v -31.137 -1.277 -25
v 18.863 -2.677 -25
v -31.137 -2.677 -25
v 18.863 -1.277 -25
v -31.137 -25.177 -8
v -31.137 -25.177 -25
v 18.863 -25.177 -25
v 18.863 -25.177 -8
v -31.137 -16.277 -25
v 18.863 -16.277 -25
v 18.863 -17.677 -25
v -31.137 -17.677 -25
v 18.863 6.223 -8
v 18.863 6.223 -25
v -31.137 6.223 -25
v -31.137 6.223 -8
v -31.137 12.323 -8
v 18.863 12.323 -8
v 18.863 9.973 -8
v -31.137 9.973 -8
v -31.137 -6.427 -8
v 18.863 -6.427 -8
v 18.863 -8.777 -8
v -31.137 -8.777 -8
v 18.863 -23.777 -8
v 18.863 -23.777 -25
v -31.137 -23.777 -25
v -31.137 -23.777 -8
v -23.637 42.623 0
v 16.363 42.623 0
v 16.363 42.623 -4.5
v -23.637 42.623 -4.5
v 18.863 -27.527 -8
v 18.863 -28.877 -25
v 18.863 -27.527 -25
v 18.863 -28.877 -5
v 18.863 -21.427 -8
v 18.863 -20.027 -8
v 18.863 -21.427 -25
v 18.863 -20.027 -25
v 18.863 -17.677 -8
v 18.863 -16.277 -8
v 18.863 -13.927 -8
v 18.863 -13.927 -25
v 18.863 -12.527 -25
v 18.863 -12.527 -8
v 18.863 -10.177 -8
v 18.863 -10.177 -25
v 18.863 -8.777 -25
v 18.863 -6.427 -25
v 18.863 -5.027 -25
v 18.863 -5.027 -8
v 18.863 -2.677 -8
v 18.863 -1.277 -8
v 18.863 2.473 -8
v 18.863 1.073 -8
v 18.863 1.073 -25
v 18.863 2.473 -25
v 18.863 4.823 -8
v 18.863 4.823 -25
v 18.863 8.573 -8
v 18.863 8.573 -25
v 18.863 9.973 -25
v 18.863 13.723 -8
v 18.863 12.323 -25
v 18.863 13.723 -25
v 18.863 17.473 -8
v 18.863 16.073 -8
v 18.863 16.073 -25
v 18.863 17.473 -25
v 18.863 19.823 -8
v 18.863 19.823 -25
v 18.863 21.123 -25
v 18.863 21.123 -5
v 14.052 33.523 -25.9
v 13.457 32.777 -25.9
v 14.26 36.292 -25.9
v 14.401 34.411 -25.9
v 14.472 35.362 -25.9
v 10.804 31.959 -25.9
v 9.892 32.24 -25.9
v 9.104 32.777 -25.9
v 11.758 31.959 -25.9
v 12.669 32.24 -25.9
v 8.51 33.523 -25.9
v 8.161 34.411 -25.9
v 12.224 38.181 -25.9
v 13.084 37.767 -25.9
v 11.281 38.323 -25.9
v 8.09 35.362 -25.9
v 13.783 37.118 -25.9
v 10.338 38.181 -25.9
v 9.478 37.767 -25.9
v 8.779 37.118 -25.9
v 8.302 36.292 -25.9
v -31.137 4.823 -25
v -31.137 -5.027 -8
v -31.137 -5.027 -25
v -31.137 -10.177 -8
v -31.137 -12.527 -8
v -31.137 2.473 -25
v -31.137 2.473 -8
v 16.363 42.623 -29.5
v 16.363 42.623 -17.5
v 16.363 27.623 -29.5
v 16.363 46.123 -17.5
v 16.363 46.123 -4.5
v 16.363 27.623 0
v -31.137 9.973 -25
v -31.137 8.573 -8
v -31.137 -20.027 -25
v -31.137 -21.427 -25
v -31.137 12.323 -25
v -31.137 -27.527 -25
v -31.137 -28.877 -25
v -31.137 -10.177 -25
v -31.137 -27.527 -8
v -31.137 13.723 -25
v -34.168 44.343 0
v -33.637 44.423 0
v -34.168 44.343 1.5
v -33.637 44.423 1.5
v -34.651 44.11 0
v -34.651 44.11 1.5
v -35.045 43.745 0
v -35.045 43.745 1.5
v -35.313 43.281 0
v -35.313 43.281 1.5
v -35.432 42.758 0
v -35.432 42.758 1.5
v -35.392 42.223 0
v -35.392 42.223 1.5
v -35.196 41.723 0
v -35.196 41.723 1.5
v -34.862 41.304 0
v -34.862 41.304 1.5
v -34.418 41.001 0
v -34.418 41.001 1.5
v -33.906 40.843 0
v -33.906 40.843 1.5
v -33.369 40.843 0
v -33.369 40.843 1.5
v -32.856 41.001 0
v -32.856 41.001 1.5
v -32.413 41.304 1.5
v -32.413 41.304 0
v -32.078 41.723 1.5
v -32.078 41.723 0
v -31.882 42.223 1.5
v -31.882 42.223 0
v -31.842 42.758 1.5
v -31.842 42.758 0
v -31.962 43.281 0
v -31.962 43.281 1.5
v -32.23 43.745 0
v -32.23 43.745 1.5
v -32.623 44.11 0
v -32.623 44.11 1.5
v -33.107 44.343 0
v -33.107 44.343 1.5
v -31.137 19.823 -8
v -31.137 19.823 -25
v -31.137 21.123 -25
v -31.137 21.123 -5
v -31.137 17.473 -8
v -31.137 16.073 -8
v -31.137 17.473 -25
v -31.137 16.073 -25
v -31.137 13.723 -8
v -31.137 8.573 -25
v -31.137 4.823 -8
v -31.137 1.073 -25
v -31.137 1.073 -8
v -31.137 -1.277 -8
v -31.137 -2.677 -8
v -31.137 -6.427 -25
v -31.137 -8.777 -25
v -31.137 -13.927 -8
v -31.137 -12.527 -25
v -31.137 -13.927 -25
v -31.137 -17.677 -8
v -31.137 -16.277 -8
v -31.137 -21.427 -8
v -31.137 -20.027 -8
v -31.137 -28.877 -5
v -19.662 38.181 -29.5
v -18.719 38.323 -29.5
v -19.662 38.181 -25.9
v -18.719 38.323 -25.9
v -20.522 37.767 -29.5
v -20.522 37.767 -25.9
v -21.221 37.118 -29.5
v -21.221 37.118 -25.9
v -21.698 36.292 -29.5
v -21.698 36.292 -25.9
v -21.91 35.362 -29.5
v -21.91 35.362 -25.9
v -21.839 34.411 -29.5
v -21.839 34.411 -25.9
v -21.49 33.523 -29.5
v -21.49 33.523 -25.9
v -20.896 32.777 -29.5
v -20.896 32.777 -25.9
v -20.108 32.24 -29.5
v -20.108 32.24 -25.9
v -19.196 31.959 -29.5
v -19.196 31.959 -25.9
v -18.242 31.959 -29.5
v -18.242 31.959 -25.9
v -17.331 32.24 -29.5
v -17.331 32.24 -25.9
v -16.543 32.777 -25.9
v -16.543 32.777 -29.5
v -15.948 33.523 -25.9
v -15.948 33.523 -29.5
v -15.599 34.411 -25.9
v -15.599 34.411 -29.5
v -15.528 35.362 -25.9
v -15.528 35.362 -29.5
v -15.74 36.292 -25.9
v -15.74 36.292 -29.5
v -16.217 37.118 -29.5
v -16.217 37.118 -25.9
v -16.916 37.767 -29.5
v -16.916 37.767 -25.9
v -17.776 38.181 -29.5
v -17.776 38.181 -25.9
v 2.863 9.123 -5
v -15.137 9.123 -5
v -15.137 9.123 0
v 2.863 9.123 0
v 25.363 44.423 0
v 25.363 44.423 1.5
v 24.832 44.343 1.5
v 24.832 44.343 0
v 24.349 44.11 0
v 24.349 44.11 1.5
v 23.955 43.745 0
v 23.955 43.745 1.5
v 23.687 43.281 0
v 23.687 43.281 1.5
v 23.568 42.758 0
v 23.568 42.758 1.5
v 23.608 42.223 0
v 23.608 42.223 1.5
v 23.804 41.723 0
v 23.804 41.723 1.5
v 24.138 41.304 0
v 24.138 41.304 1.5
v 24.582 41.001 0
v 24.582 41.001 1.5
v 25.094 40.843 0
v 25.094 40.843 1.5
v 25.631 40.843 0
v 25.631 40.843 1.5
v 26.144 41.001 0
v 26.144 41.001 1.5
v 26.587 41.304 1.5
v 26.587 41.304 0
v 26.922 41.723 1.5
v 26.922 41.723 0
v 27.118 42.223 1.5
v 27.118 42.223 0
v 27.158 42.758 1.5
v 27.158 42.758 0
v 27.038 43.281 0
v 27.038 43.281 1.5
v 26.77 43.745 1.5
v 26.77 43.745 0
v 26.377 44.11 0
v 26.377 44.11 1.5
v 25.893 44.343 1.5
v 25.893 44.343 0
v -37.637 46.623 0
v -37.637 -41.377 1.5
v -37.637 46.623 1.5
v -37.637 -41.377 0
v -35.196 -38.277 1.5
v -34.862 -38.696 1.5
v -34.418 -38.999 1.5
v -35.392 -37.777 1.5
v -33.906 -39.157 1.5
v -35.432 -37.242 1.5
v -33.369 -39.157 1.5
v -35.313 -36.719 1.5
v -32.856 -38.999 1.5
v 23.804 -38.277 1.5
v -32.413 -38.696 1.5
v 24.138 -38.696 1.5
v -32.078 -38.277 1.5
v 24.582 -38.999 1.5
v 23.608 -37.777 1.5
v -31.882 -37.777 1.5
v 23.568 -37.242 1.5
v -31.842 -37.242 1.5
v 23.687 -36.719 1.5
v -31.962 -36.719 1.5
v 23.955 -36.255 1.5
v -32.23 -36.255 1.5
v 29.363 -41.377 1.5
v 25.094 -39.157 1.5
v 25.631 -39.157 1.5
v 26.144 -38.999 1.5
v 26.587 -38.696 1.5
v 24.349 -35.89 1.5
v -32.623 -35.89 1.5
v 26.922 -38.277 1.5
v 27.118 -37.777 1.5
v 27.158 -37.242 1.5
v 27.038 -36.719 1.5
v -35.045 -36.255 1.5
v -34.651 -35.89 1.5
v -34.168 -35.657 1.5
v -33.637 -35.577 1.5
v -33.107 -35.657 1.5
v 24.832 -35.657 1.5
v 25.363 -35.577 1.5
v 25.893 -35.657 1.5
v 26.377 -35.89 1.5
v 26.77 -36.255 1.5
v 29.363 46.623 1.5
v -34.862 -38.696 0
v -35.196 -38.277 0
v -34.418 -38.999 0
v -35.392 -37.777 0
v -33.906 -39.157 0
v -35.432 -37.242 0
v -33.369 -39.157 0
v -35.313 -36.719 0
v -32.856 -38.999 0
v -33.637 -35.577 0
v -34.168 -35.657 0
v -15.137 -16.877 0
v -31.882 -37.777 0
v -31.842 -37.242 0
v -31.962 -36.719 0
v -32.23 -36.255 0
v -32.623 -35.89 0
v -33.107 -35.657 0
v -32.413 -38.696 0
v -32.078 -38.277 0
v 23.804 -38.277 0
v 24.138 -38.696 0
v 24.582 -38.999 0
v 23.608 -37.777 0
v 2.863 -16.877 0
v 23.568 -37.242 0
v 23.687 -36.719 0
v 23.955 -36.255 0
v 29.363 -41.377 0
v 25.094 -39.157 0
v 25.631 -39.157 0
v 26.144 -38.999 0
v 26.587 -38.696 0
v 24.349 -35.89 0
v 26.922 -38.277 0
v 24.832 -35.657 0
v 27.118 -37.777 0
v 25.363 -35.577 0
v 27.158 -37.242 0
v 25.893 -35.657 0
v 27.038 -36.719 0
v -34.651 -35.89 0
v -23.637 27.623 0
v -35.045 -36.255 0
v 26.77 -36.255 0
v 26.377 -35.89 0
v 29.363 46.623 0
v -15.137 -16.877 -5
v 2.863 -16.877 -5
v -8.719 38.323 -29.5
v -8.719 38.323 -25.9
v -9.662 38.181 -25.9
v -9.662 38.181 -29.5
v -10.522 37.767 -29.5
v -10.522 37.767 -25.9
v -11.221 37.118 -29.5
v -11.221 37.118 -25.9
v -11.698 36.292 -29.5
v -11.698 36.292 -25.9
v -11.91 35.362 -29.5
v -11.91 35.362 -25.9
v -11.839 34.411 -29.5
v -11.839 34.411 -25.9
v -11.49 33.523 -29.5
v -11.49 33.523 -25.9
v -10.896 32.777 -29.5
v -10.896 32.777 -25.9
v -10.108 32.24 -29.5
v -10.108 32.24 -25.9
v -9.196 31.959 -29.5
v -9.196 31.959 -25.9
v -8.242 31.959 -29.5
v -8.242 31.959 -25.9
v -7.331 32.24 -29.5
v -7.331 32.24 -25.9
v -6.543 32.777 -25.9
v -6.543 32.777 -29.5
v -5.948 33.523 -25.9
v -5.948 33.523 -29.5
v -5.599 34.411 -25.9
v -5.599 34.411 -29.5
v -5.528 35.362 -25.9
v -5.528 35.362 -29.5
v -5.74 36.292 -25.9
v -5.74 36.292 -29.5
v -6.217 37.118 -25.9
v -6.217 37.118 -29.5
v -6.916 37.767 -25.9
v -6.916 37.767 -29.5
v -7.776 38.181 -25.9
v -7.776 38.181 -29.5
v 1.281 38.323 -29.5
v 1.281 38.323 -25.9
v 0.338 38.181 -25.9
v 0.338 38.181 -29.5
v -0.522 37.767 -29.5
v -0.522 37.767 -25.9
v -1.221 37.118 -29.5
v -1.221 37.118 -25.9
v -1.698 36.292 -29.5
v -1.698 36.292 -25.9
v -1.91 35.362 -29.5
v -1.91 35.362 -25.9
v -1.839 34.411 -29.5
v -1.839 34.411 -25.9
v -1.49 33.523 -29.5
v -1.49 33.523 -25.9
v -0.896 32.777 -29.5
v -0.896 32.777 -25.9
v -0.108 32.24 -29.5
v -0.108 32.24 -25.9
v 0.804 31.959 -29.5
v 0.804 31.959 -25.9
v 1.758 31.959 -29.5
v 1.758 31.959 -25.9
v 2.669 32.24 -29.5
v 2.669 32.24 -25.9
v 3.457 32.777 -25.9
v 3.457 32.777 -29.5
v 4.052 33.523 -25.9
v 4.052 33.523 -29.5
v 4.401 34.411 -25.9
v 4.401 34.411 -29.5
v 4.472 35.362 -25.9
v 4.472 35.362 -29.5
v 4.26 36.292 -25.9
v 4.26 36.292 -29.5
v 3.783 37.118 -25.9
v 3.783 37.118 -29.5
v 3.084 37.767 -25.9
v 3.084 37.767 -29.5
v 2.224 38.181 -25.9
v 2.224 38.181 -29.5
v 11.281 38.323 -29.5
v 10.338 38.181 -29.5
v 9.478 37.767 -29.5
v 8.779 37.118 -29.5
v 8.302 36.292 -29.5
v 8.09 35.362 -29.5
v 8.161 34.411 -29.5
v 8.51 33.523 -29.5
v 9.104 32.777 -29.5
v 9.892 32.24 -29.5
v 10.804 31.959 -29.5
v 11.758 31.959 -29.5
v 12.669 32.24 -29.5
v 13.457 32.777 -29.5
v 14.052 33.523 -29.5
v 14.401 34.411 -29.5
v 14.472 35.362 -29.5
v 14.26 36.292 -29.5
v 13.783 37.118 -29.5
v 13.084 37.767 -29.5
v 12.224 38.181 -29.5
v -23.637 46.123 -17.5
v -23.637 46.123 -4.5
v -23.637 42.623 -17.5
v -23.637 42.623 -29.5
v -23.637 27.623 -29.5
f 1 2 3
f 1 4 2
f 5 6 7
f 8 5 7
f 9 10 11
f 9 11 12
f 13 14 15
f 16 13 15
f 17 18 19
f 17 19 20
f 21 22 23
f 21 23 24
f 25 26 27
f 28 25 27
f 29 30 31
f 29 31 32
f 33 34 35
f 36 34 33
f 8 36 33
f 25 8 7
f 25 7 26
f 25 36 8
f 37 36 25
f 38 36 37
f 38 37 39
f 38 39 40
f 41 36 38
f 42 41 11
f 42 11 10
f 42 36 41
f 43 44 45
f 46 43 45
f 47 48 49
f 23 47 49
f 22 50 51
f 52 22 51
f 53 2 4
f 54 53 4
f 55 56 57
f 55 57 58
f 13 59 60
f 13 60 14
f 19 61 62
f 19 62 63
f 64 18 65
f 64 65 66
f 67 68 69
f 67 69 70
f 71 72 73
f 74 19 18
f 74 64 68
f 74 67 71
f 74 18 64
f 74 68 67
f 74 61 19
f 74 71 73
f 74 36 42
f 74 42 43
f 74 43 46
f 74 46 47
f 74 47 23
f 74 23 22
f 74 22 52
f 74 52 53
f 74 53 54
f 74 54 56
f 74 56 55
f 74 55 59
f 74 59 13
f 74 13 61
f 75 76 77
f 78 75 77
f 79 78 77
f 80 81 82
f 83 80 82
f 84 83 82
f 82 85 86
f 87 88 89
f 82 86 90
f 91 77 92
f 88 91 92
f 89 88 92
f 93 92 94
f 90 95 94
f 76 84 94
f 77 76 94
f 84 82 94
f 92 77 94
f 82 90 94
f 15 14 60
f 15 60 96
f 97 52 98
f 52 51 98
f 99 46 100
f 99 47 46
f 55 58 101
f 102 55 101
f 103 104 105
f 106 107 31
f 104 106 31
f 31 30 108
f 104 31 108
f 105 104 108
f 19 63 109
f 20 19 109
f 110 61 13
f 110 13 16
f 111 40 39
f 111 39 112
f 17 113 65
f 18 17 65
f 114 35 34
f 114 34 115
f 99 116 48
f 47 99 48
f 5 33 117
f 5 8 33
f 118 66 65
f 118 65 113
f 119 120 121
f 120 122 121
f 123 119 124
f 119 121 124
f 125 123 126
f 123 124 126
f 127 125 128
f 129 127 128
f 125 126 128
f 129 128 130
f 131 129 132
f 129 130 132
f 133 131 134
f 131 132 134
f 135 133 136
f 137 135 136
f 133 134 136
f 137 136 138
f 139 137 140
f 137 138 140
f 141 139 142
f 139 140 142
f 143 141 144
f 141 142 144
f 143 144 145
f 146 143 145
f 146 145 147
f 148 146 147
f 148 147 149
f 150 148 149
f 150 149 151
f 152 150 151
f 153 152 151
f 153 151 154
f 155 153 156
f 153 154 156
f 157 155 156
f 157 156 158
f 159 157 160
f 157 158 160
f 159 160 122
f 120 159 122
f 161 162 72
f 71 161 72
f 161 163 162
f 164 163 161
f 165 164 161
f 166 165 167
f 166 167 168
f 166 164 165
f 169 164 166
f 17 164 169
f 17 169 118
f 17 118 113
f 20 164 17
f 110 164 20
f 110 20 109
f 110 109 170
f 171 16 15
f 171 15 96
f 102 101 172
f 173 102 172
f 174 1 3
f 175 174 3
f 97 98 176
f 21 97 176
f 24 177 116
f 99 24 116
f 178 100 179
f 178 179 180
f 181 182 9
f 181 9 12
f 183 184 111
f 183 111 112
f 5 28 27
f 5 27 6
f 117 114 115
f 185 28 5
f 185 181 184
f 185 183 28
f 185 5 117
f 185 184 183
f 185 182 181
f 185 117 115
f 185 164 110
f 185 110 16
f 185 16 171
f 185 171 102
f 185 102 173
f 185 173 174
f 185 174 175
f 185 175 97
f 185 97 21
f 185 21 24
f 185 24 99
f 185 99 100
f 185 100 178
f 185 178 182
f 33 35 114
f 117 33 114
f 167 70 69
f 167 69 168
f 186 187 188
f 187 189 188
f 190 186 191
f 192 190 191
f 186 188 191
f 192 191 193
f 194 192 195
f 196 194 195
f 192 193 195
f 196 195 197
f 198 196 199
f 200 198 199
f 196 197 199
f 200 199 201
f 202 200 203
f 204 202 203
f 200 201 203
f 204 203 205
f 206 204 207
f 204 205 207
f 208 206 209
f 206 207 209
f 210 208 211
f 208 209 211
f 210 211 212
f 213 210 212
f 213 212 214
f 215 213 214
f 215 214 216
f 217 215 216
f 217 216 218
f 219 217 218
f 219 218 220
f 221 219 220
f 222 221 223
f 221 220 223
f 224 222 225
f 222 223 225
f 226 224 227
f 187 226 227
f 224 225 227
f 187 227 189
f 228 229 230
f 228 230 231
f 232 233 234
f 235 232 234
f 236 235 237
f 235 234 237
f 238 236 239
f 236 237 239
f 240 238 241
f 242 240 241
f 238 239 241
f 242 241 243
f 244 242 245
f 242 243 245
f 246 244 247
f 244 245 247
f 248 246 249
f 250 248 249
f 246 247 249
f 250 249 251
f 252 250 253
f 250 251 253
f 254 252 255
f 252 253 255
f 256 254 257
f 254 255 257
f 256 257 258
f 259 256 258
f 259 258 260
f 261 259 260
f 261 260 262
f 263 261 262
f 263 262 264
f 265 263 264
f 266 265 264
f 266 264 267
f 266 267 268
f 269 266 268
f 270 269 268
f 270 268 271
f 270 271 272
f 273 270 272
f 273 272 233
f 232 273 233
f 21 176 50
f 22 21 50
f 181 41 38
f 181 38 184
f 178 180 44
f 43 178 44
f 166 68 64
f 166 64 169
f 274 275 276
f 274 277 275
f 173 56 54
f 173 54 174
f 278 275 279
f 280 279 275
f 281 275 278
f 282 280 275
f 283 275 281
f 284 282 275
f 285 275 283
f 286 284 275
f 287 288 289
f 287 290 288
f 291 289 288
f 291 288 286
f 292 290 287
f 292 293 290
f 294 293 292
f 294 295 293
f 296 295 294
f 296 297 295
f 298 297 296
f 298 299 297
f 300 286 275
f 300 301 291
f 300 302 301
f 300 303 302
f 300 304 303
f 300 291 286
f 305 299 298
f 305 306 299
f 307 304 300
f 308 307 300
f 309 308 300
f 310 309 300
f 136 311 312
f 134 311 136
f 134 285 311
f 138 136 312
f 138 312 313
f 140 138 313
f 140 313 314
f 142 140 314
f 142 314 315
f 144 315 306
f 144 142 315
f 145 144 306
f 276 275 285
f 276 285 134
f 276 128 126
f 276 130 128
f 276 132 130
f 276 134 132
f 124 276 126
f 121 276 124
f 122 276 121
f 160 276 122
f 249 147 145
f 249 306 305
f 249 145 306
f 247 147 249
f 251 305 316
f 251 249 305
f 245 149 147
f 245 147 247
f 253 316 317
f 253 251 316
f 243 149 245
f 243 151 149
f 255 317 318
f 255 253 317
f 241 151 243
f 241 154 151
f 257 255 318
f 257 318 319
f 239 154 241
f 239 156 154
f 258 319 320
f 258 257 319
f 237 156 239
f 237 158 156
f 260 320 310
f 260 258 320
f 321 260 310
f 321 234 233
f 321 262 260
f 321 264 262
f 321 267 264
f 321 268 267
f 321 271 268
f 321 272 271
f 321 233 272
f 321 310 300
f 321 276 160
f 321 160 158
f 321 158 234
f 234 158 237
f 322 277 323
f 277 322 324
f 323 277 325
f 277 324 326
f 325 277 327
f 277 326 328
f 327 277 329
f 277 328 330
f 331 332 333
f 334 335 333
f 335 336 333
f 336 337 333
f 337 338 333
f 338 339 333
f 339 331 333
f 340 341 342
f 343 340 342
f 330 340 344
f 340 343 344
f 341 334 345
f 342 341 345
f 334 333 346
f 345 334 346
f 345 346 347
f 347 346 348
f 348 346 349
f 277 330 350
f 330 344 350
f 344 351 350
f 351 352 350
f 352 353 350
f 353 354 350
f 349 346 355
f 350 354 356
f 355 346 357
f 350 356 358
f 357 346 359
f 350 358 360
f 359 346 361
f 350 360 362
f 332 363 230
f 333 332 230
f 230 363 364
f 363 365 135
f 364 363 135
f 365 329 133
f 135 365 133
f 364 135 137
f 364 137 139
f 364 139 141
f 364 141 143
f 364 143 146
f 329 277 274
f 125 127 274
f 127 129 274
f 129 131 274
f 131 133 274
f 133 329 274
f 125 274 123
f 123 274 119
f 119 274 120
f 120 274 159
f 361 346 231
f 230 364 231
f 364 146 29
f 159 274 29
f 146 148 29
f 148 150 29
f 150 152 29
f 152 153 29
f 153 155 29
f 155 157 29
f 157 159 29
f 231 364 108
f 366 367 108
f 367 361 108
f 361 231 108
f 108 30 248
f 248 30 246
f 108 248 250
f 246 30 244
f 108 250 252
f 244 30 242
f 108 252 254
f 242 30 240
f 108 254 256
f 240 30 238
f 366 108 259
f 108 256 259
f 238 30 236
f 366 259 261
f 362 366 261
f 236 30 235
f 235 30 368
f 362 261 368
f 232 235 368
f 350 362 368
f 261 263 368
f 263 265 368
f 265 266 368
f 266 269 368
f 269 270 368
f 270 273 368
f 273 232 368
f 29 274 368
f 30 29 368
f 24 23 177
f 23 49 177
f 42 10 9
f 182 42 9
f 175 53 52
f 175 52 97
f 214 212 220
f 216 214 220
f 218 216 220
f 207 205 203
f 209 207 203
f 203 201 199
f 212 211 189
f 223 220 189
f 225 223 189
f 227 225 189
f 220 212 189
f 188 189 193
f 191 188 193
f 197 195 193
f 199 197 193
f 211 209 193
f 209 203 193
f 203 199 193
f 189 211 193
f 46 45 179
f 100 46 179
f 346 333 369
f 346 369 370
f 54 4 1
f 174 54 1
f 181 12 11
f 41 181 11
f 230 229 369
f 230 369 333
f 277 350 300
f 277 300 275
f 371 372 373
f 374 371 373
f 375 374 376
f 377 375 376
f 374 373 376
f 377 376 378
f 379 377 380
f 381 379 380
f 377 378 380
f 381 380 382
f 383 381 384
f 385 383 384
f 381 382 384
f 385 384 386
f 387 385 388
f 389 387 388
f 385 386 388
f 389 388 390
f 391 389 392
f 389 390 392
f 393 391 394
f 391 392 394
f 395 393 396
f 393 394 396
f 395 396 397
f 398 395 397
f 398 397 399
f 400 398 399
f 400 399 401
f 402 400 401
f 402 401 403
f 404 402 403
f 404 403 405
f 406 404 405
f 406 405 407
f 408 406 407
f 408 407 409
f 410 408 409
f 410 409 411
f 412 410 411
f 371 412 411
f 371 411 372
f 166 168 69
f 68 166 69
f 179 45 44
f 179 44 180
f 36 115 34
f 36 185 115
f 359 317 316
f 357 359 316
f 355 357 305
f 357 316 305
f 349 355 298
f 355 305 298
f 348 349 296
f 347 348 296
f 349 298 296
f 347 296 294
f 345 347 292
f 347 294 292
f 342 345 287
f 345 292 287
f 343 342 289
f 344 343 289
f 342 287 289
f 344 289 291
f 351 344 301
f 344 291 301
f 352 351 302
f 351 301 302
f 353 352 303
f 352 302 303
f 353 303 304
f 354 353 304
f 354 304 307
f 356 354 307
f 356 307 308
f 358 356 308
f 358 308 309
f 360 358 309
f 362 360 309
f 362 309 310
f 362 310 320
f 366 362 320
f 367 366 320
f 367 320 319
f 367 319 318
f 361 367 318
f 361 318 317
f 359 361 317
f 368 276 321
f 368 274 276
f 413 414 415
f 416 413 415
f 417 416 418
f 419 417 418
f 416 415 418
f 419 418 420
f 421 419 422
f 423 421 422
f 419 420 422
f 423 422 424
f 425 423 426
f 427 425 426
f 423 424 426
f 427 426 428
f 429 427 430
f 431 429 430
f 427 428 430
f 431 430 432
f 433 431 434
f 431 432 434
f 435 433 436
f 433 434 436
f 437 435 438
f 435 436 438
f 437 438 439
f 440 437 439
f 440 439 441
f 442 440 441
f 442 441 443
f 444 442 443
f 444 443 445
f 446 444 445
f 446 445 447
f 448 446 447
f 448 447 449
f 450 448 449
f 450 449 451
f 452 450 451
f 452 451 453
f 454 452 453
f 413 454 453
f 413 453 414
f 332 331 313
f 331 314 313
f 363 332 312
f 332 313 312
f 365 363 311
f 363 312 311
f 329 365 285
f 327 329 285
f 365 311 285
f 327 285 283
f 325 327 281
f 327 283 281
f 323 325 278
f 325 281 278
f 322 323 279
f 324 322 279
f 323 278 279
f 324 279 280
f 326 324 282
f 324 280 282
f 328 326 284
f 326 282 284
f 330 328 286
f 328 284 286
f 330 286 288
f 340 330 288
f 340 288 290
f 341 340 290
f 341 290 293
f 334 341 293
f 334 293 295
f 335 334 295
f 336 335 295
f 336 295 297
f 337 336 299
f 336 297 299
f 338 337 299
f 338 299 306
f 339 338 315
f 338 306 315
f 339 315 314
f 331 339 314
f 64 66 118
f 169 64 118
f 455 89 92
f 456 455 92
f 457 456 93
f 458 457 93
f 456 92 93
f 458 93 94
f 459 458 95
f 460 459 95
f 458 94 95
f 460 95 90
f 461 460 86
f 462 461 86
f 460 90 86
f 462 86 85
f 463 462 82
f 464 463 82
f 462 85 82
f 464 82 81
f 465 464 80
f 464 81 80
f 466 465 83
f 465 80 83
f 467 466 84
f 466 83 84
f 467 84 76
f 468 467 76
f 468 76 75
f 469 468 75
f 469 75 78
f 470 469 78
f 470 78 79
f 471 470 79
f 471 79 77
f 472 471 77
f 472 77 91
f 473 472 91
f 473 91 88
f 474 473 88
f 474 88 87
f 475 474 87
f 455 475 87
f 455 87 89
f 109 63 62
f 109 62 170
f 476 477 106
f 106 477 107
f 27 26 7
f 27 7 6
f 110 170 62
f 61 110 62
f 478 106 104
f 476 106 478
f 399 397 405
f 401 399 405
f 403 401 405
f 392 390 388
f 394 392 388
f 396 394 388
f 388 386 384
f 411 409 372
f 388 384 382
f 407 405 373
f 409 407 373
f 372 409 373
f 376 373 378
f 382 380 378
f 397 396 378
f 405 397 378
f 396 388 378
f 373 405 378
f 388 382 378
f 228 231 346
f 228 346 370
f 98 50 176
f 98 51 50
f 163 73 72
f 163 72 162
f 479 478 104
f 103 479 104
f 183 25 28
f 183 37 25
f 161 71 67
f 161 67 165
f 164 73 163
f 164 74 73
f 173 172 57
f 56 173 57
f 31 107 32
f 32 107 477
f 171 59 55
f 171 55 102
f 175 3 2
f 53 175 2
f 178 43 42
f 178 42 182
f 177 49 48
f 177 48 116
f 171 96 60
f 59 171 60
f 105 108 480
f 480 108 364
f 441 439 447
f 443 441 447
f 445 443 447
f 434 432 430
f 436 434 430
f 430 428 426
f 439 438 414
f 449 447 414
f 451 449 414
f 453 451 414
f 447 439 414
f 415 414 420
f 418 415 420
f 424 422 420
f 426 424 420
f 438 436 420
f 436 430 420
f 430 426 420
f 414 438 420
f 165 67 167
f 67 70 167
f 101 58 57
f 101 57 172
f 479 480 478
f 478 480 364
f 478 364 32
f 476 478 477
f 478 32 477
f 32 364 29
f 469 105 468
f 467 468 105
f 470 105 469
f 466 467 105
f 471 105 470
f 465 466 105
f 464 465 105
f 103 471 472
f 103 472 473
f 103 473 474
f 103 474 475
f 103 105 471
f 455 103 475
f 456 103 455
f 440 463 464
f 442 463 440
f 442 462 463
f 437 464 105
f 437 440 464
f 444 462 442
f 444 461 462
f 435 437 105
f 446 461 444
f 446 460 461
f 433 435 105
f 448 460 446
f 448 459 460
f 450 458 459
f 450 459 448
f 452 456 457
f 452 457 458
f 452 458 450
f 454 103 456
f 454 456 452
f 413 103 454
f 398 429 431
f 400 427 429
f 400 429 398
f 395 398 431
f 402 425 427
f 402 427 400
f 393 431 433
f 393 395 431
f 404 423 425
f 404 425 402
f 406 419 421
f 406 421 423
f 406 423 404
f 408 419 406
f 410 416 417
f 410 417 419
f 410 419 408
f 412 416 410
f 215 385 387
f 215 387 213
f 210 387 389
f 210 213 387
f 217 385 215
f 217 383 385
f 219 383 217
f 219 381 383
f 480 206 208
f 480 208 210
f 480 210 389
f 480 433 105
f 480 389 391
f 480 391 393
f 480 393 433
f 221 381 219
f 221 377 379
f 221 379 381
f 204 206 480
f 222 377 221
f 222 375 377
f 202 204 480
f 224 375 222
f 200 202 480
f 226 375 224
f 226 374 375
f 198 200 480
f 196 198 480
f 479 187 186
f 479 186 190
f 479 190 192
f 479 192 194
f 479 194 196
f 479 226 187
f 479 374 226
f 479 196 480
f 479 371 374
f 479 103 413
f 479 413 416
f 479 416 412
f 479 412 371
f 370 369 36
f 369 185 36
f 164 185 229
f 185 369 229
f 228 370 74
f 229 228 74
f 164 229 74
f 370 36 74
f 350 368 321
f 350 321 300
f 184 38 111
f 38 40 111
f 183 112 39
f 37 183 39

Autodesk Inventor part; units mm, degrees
ref_plane "YZ Plane" through (0, 0, 0) normal (1, 0, 0) x (0, 1, 0)
ref_plane "XZ Plane" through (0, 0, 0) normal (0, 1, 0) x (-1, 0, 0)
ref_plane "XY Plane" through (0, 0, 0) normal (0, 0, 1) x (1, 0, 0)
sketch "Szkic1" plane through (0, 0, 0) normal (0, 0, 1) x (1, 0, 0)
  line L0 (-37.6373, 46.6232) -> (29.3627, 46.6232)
  line L1 (29.3627, 46.6232) -> (29.3627, -41.3768)
  line L2 (29.3627, -41.3768) -> (-37.6373, -41.3768)
  line L3 (-37.6373, -41.3768) -> (-37.6373, 46.6232)
  point P0 (0, 0)
  point P1 (-33.6373, 42.6232)
  point P2 (25.3627, 42.6232)
  point P3 (25.3627, -37.3768)
  point P4 (-33.6373, -37.3768)
  dimension "d0" = 88
  dimension "d1" = 67
  dimension "d2" = 59
  dimension "d3" = 80
  dimension "d4" = 80
  dimension "d5" = 59
  dimension "d6" = 4
  dimension "d7" = 4
  dimension "d8" = 4
  dimension "d9" = 4
  dimension "d10" = 4
  dimension "d11" = 4
  dimension "d12" = 4
extrude "Wyciągnięcie proste1" add sketch "Szkic1" along normal blind 1.5
hole "Otwór1" at (-33.6373, 42.6232, 0) at (25.3627, 42.6232, 0) at (25.3627, -37.3768, 0) at (-33.6373, -37.3768, 0) direction (0, 0, 1) diameter 3.6 end through all
sketch "Szkic2" plane through (0, 0, 0) normal (0, 0, -1) x (-1, 0, 0)
  line L0 (-18.8627, 21.1232) -> (31.1373, 21.1232)
  line L1 (31.1373, 21.1232) -> (31.1373, -28.8768)
  line L2 (31.1373, -28.8768) -> (-18.8627, -28.8768)
  line L3 (-18.8627, -28.8768) -> (-18.8627, 21.1232)
  circle A0 centre (-25.3627, -37.3768) radius 1.8 projected
  circle A1 centre (33.6373, 42.6232) radius 1.8 projected
  circle A2 centre (-25.3627, 42.6232) radius 1.8 projected
  circle A3 centre (33.6373, -37.3768) radius 1.8 projected
  line L4 (37.6373, 46.6232) -> (-29.3627, 46.6232) projected
  line L5 (-29.3627, 46.6232) -> (-29.3627, -41.3768) projected
  line L6 (-29.3627, -41.3768) -> (37.6373, -41.3768) projected
  line L7 (37.6373, -41.3768) -> (37.6373, 46.6232) projected
  line L8 (-16.3627, 42.6232) -> (23.6373, 42.6232)
  line L9 (23.6373, 42.6232) -> (23.6373, 27.6232)
  line L10 (23.6373, 27.6232) -> (-16.3627, 27.6232)
  line L11 (-16.3627, 27.6232) -> (-16.3627, 42.6232)
  point P0 (0, 0)
  dimension "d22" = 50
  dimension "d23" = 50
  dimension "d24" = 6.5
  dimension "d25" = 12.5
  dimension "d26" = 40
  dimension "d27" = 15
  dimension "d28" = 13
  dimension "d29" = 4
extrude "Wyciągnięcie proste2" add sketch "Szkic2" along normal blind 25 contours L0 L1 L2 L3
sketch "Szkic3" plane through (0, 0, -25) normal (0, 0, -1) x (-1, 0, 0)
  line L0 (31.1373, 21.1232) -> (-18.8627, 21.1232) projected
  line L1 (-18.8627, 21.1232) -> (-18.8627, -28.8768) projected
  line L2 (-18.8627, -28.8768) -> (31.1373, -28.8768) projected
  line L3 (31.1373, -28.8768) -> (31.1373, 21.1232) projected
  line L4 (-18.8627, -28.8768) -> (-18.8627, 21.1232) projected
  line L5 (-18.8627, -27.5268) -> (31.1373, -27.5268)
  line L6 (31.1373, -27.5268) -> (31.1373, -25.1768)
  line L7 (31.1373, -25.1768) -> (-18.8627, -25.1768)
  line L8 (-18.8627, -25.1768) -> (-18.8627, -27.5268)
  line L9 (-18.8627, -23.7768) -> (31.1373, -23.7768)
  line L10 (31.1373, -23.7768) -> (31.1373, -21.4268)
  line L11 (31.1373, -21.4268) -> (-18.8627, -21.4268)
  line L12 (-18.8627, -21.4268) -> (-18.8627, -23.7768)
  line L13 (-18.8627, -20.0268) -> (31.1373, -20.0268)
  line L14 (31.1373, -20.0268) -> (31.1373, -17.6768)
  line L15 (31.1373, -17.6768) -> (-18.8627, -17.6768)
  line L16 (-18.8627, -17.6768) -> (-18.8627, -20.0268)
  line L17 (-18.8627, -16.2768) -> (31.1373, -16.2768)
  line L18 (31.1373, -16.2768) -> (31.1373, -13.9268)
  line L19 (31.1373, -13.9268) -> (-18.8627, -13.9268)
  line L20 (-18.8627, -13.9268) -> (-18.8627, -16.2768)
  line L21 (-18.8627, -12.5268) -> (31.1373, -12.5268)
  line L22 (31.1373, -12.5268) -> (31.1373, -10.1768)
  line L23 (31.1373, -10.1768) -> (-18.8627, -10.1768)
  line L24 (-18.8627, -10.1768) -> (-18.8627, -12.5268)
  line L25 (-18.8627, -8.7768) -> (31.1373, -8.7768)
  line L26 (31.1373, -8.7768) -> (31.1373, -6.4268)
  line L27 (31.1373, -6.4268) -> (-18.8627, -6.4268)
  line L28 (-18.8627, -6.4268) -> (-18.8627, -8.7768)
  line L29 (-18.8627, -5.0268) -> (31.1373, -5.0268)
  line L30 (31.1373, -5.0268) -> (31.1373, -2.6768)
  line L31 (31.1373, -2.6768) -> (-18.8627, -2.6768)
  line L32 (-18.8627, -2.6768) -> (-18.8627, -5.0268)
  line L33 (-18.8627, -1.2768) -> (31.1373, -1.2768)
  line L34 (31.1373, -1.2768) -> (31.1373, 1.0732)
  line L35 (31.1373, 1.0732) -> (-18.8627, 1.0732)
  line L36 (-18.8627, 1.0732) -> (-18.8627, -1.2768)
  line L37 (-18.8627, 2.4732) -> (31.1373, 2.4732)
  line L38 (31.1373, 2.4732) -> (31.1373, 4.8232)
  line L39 (31.1373, 4.8232) -> (-18.8627, 4.8232)
  line L40 (-18.8627, 4.8232) -> (-18.8627, 2.4732)
  line L41 (-18.8627, 6.2232) -> (31.1373, 6.2232)
  line L42 (31.1373, 6.2232) -> (31.1373, 8.5732)
  line L43 (31.1373, 8.5732) -> (-18.8627, 8.5732)
  line L44 (-18.8627, 8.5732) -> (-18.8627, 6.2232)
  line L45 (-18.8627, 9.9732) -> (31.1373, 9.9732)
  line L46 (31.1373, 9.9732) -> (31.1373, 12.3232)
  line L47 (31.1373, 12.3232) -> (-18.8627, 12.3232)
  line L48 (-18.8627, 12.3232) -> (-18.8627, 9.9732)
  line L49 (-18.8627, 13.7232) -> (31.1373, 13.7232)
  line L50 (31.1373, 13.7232) -> (31.1373, 16.0732)
  line L51 (31.1373, 16.0732) -> (-18.8627, 16.0732)
  line L52 (-18.8627, 16.0732) -> (-18.8627, 13.7232)
  line L53 (-18.8627, 17.4732) -> (31.1373, 17.4732)
  line L54 (31.1373, 17.4732) -> (31.1373, 19.8232)
  line L55 (31.1373, 19.8232) -> (-18.8627, 19.8232)
  line L56 (-18.8627, 19.8232) -> (-18.8627, 17.4732)
  point P0 (0, 0)
  dimension "d32" = 50
  dimension "d33" = 2.35
  dimension "d34" = 1.35
  dimension "d37" = 3.75
extrude "Wyciągnięcie proste3" cut sketch "Szkic3" against normal blind 17 contours L3 L53 L1 L55 | L3 L49 L1 L51 | L3 L45 L1 L47 | L3 L41 L1 L43 | L3 L37 L1 L39 | L3 L33 L1 L35 | L3 L29 L1 L31 | L3 L25 L1 L27 | L3 L21 L1 L23 | L3 L17 L1 L19 | L3 L13 L1 L15 | L3 L9 L1 L11 | L3 L5 L1 L7
sketch "Szkic4" plane through (-31.1373, -28.8768, 0) normal (-1, 0, 0) x (0, 0, 1)
  line L0 (-8, 42.6) -> (-25, 42.6) projected
  line L1 (-25, 41.2) -> (-25, 42.6) projected
  line L2 (-25, 41.2) -> (-8, 41.2) projected
  line L3 (-8, 41.2) -> (-8, 38.85) projected
  line L4 (-8, 38.85) -> (-25, 38.85) projected
  line L5 (-25, 37.45) -> (-25, 38.85) projected
  line L6 (-25, 37.45) -> (-8, 37.45) projected
  line L7 (-8, 37.45) -> (-8, 35.1) projected
  line L8 (-8, 35.1) -> (-25, 35.1) projected
  line L9 (-25, 33.7) -> (-25, 35.1) projected
  line L10 (-25, 33.7) -> (-8, 33.7) projected
  line L11 (-8, 33.7) -> (-8, 31.35) projected
  line L12 (-8, 31.35) -> (-25, 31.35) projected
  line L13 (-25, 29.95) -> (-25, 31.35) projected
  line L14 (-25, 29.95) -> (-8, 29.95) projected
  line L15 (-8, 29.95) -> (-8, 27.6) projected
  line L16 (-8, 27.6) -> (-25, 27.6) projected
  line L17 (-25, 26.2) -> (-25, 27.6) projected
  line L18 (-25, 26.2) -> (-8, 26.2) projected
  line L19 (-8, 26.2) -> (-8, 23.85) projected
  line L20 (-8, 23.85) -> (-25, 23.85) projected
  line L21 (-25, 22.45) -> (-25, 23.85) projected
  line L22 (-25, 22.45) -> (-8, 22.45) projected
  line L23 (-8, 22.45) -> (-8, 20.1) projected
  line L24 (-8, 20.1) -> (-25, 20.1) projected
  line L25 (-25, 18.7) -> (-25, 20.1) projected
  line L26 (-25, 18.7) -> (-8, 18.7) projected
  line L27 (-8, 18.7) -> (-8, 16.35) projected
  line L28 (-8, 16.35) -> (-25, 16.35) projected
  line L29 (-25, 14.95) -> (-25, 16.35) projected
  line L30 (-25, 14.95) -> (-8, 14.95) projected
  line L31 (-8, 14.95) -> (-8, 12.6) projected
  line L32 (-8, 12.6) -> (-25, 12.6) projected
  line L33 (-25, 11.2) -> (-25, 12.6) projected
  line L34 (-25, 11.2) -> (-8, 11.2) projected
  line L35 (-8, 11.2) -> (-8, 8.85) projected
  line L36 (-8, 8.85) -> (-25, 8.85) projected
  line L37 (-25, 7.45) -> (-25, 8.85) projected
  line L38 (-25, 7.45) -> (-8, 7.45) projected
  line L39 (-8, 7.45) -> (-8, 5.1) projected
  line L40 (-8, 5.1) -> (-25, 5.1) projected
  line L41 (-25, 3.7) -> (-25, 5.1) projected
  line L42 (-25, 3.7) -> (-8, 3.7) projected
  line L43 (-8, 3.7) -> (-8, 1.35) projected
  line L44 (-8, 1.35) -> (-25, 1.35) projected
  line L45 (-25, 0) -> (-25, 1.35) projected
  line L46 (0, 0) -> (-25, 0) projected
  line L47 (0, 50) -> (0, 0) projected
  line L48 (0, 50) -> (-25, 50) projected
  line L49 (-25, 48.7) -> (-25, 50) projected
  line L50 (-25, 48.7) -> (-8, 48.7) projected
  line L51 (-8, 48.7) -> (-8, 46.35) projected
  line L52 (-8, 46.35) -> (-25, 46.35) projected
  line L53 (-25, 44.95) -> (-25, 46.35) projected
  line L54 (-25, 44.95) -> (-8, 44.95) projected
  line L55 (-8, 44.95) -> (-8, 42.6) projected
  line L56 (0, 50) -> (0, 0) projected
  line L57 (0, 50) -> (-25, 50) projected
  line L58 (0, 0) -> (-5, 0)
  line L59 (-5, 0) -> (-5, 50)
  line L60 (-5, 50) -> (0, 50)
  line L61 (0, 50) -> (0, 0)
  point P0 (0, 28.8768)
  dimension "d44" = 5
extrude "Wyciągnięcie proste4" cut sketch "Szkic4" against normal blind 16 contours L48 L47 L46 L59
sketch "Szkic5" plane through (18.8627, -28.8768, 0) normal (1, 0, 0) x (0, 0, -1)
  line L0 (25, 42.6) -> (8, 42.6) projected
  line L1 (8, 42.6) -> (8, 44.95) projected
  line L2 (8, 44.95) -> (25, 44.95) projected
  line L3 (25, 46.35) -> (25, 44.95) projected
  line L4 (25, 46.35) -> (8, 46.35) projected
  line L5 (8, 46.35) -> (8, 48.7) projected
  line L6 (8, 48.7) -> (25, 48.7) projected
  line L7 (25, 50) -> (25, 48.7) projected
  line L8 (0, 50) -> (25, 50) projected
  line L9 (0, 0) -> (0, 50) projected
  line L10 (0, 0) -> (25, 0) projected
  line L11 (25, 1.35) -> (25, 0) projected
  line L12 (25, 1.35) -> (8, 1.35) projected
  line L13 (8, 1.35) -> (8, 3.7) projected
  line L14 (8, 3.7) -> (25, 3.7) projected
  line L15 (25, 5.1) -> (25, 3.7) projected
  line L16 (25, 5.1) -> (8, 5.1) projected
  line L17 (8, 5.1) -> (8, 7.45) projected
  line L18 (8, 7.45) -> (25, 7.45) projected
  line L19 (25, 8.85) -> (25, 7.45) projected
  line L20 (25, 8.85) -> (8, 8.85) projected
  line L21 (8, 8.85) -> (8, 11.2) projected
  line L22 (8, 11.2) -> (25, 11.2) projected
  line L23 (25, 12.6) -> (25, 11.2) projected
  line L24 (25, 12.6) -> (8, 12.6) projected
  line L25 (8, 12.6) -> (8, 14.95) projected
  line L26 (8, 14.95) -> (25, 14.95) projected
  line L27 (25, 16.35) -> (25, 14.95) projected
  line L28 (25, 16.35) -> (8, 16.35) projected
  line L29 (8, 16.35) -> (8, 18.7) projected
  line L30 (8, 18.7) -> (25, 18.7) projected
  line L31 (25, 20.1) -> (25, 18.7) projected
  line L32 (25, 20.1) -> (8, 20.1) projected
  line L33 (8, 20.1) -> (8, 22.45) projected
  line L34 (8, 22.45) -> (25, 22.45) projected
  line L35 (25, 23.85) -> (25, 22.45) projected
  line L36 (25, 23.85) -> (8, 23.85) projected
  line L37 (8, 23.85) -> (8, 26.2) projected
  line L38 (8, 26.2) -> (25, 26.2) projected
  line L39 (25, 27.6) -> (25, 26.2) projected
  line L40 (25, 27.6) -> (8, 27.6) projected
  line L41 (8, 27.6) -> (8, 29.95) projected
  line L42 (8, 29.95) -> (25, 29.95) projected
  line L43 (25, 31.35) -> (25, 29.95) projected
  line L44 (25, 31.35) -> (8, 31.35) projected
  line L45 (8, 31.35) -> (8, 33.7) projected
  line L46 (8, 33.7) -> (25, 33.7) projected
  line L47 (25, 35.1) -> (25, 33.7) projected
  line L48 (25, 35.1) -> (8, 35.1) projected
  line L49 (8, 35.1) -> (8, 37.45) projected
  line L50 (8, 37.45) -> (25, 37.45) projected
  line L51 (25, 38.85) -> (25, 37.45) projected
  line L52 (25, 38.85) -> (8, 38.85) projected
  line L53 (8, 38.85) -> (8, 41.2) projected
  line L54 (8, 41.2) -> (25, 41.2) projected
  line L55 (25, 42.6) -> (25, 41.2) projected
  line L56 (5, 0) -> (5, 50) projected
  point P0 (0, 28.8768)
extrude "Wyciągnięcie proste5" cut sketch "Szkic5" against normal blind 16 contours L56 L10 L9 L8
sketch "Szkic6" plane through (-31.1373, 21.1232, -25) normal (0, 1, 0) x (1, 0, 0)
  line L0 (34, -25) -> (34, -20) projected
  line L1 (34, -20) -> (50, -20) projected
  line L2 (50, -20) -> (50, 0) projected
  line L3 (0, 0) -> (50, 0) projected
  line L4 (0, -20) -> (0, 0) projected
  line L5 (0, -20) -> (16, -20) projected
  line L6 (16, -20) -> (16, -25) projected
  line L7 (34, -25) -> (16, -25) projected
  line L8 (16, -25) -> (16, -20) projected
  line L9 (34, -20) -> (50, -20) projected
  line L10 (16, -25) -> (34, -25)
  line L11 (34, -25) -> (34, -20)
  line L12 (34, -20) -> (16, -20)
  line L13 (16, -20) -> (16, -25)
  point P0 (31.1373, -25)
extrude "Wyciągnięcie proste6" cut sketch "Szkic6" against normal blind 12 contours L7 L6 L12 L0
sketch "Szkic7" plane through (-31.1373, -28.8768, -25) normal (0, -1, 0) x (1, 0, 0)
  line L0 (34, 20) -> (34, 25) projected
  line L1 (16, 25) -> (34, 25) projected
  line L2 (16, 25) -> (16, 20) projected
  line L3 (16, 20) -> (0, 20) projected
  line L4 (0, 20) -> (0, 0) projected
  line L5 (50, 0) -> (0, 0) projected
  line L6 (50, 20) -> (50, 0) projected
  line L7 (50, 20) -> (34, 20) projected
  line L8 (16, 20) -> (34, 20) projected
  point P0 (31.1373, 25)
extrude "Wyciągnięcie proste7" cut sketch "Szkic7" against normal blind 12 contours L8 L2 L1 L0
extrude "Wyciągnięcie proste8" add sketch "Szkic2" along normal blind 4.5 contours L8 L9 L10 L11
sketch "Szkic8" plane through (0, 0, -4.5) normal (0, 0, -1) x (-1, 0, 0)
  line L0 (23.6373, 42.6232) -> (-16.3627, 42.6232) projected
  line L1 (-16.3627, 42.6232) -> (-16.3627, 27.6232) projected
  line L2 (-16.3627, 27.6232) -> (23.6373, 27.6232) projected
  line L3 (23.6373, 27.6232) -> (23.6373, 42.6232) projected
  line L4 (-16.3627, 27.6232) -> (23.6373, 27.6232)
  line L5 (23.6373, 27.6232) -> (23.6373, 46.1232)
  line L6 (23.6373, 46.1232) -> (-16.3627, 46.1232)
  line L7 (-16.3627, 46.1232) -> (-16.3627, 27.6232)
  point P0 (0, 0)
  dimension "d55" = 40
  dimension "d56" = 18.5
extrude "Wyciągnięcie proste9" add sketch "Szkic8" along normal blind 13
sketch "Szkic9" plane through (0, 0, -17.5) normal (0, 0, -1) x (-1, 0, 0)
  line L0 (-16.3627, 27.6232) -> (23.6373, 27.6232) projected
  line L1 (23.6373, 27.6232) -> (23.6373, 46.1232) projected
  line L2 (23.6373, 46.1232) -> (-16.3627, 46.1232) projected
  line L3 (-16.3627, 46.1232) -> (-16.3627, 27.6232) projected
  line L4 (23.6373, 42.6232) -> (-16.3627, 42.6232) projected
  point P0 (0, 0)
extrude "Wyciągnięcie proste10" add sketch "Szkic9" along normal blind 12 contours L3 L4 L1 L0
sketch "Szkic10" plane through (0, 0, -29.5) normal (0, 0, -1) x (-1, 0, 0)
  line L0 (-16.3627, 27.6232) -> (23.6373, 27.6232) projected
  line L1 (23.6373, 27.6232) -> (23.6373, 42.6232) projected
  line L2 (23.6373, 42.6232) -> (-16.3627, 42.6232) projected
  line L3 (-16.3627, 42.6232) -> (-16.3627, 27.6232) projected
  point P0 (0, 0)
  point P1 (18.7191, 35.1232)
  point P2 (8.7191, 35.1232)
  point P3 (-1.2809, 35.1232)
  point P4 (-11.2809, 35.1232)
  dimension "d61" = 15
  dimension "d62" = 7.5
  dimension "d63" = 7.5
  dimension "d64" = 7.5
  dimension "d65" = 7.5
  dimension "d66" = 10
  dimension "d67" = 10
  dimension "d68" = 10
hole "Otwór2" at (-18.7191, 35.1232, -29.5) at (-8.7191, 35.1232, -29.5) at (1.2809, 35.1232, -29.5) at (11.2809, 35.1232, -29.5) direction (0, 0, 1) diameter 6.4 depth 3.6
equation "\"d4\" = d3"
equation "\"d5\" = d2"
equation "\"d6\" = -0.5 * d5 + 0.5 * d1"
equation "\"d7\" = -0.5 * d4 + 0.5 * d0"
equation "\"d8\" = d6"
equation "\"d9\" = d7"
equation "\"d64\" = d62"
equation "\"d67\" = d66"
equation "\"d68\" = d66"
properties part number "COTS_Generic_MKS_Mosfet_Module_For_Heatbed"
